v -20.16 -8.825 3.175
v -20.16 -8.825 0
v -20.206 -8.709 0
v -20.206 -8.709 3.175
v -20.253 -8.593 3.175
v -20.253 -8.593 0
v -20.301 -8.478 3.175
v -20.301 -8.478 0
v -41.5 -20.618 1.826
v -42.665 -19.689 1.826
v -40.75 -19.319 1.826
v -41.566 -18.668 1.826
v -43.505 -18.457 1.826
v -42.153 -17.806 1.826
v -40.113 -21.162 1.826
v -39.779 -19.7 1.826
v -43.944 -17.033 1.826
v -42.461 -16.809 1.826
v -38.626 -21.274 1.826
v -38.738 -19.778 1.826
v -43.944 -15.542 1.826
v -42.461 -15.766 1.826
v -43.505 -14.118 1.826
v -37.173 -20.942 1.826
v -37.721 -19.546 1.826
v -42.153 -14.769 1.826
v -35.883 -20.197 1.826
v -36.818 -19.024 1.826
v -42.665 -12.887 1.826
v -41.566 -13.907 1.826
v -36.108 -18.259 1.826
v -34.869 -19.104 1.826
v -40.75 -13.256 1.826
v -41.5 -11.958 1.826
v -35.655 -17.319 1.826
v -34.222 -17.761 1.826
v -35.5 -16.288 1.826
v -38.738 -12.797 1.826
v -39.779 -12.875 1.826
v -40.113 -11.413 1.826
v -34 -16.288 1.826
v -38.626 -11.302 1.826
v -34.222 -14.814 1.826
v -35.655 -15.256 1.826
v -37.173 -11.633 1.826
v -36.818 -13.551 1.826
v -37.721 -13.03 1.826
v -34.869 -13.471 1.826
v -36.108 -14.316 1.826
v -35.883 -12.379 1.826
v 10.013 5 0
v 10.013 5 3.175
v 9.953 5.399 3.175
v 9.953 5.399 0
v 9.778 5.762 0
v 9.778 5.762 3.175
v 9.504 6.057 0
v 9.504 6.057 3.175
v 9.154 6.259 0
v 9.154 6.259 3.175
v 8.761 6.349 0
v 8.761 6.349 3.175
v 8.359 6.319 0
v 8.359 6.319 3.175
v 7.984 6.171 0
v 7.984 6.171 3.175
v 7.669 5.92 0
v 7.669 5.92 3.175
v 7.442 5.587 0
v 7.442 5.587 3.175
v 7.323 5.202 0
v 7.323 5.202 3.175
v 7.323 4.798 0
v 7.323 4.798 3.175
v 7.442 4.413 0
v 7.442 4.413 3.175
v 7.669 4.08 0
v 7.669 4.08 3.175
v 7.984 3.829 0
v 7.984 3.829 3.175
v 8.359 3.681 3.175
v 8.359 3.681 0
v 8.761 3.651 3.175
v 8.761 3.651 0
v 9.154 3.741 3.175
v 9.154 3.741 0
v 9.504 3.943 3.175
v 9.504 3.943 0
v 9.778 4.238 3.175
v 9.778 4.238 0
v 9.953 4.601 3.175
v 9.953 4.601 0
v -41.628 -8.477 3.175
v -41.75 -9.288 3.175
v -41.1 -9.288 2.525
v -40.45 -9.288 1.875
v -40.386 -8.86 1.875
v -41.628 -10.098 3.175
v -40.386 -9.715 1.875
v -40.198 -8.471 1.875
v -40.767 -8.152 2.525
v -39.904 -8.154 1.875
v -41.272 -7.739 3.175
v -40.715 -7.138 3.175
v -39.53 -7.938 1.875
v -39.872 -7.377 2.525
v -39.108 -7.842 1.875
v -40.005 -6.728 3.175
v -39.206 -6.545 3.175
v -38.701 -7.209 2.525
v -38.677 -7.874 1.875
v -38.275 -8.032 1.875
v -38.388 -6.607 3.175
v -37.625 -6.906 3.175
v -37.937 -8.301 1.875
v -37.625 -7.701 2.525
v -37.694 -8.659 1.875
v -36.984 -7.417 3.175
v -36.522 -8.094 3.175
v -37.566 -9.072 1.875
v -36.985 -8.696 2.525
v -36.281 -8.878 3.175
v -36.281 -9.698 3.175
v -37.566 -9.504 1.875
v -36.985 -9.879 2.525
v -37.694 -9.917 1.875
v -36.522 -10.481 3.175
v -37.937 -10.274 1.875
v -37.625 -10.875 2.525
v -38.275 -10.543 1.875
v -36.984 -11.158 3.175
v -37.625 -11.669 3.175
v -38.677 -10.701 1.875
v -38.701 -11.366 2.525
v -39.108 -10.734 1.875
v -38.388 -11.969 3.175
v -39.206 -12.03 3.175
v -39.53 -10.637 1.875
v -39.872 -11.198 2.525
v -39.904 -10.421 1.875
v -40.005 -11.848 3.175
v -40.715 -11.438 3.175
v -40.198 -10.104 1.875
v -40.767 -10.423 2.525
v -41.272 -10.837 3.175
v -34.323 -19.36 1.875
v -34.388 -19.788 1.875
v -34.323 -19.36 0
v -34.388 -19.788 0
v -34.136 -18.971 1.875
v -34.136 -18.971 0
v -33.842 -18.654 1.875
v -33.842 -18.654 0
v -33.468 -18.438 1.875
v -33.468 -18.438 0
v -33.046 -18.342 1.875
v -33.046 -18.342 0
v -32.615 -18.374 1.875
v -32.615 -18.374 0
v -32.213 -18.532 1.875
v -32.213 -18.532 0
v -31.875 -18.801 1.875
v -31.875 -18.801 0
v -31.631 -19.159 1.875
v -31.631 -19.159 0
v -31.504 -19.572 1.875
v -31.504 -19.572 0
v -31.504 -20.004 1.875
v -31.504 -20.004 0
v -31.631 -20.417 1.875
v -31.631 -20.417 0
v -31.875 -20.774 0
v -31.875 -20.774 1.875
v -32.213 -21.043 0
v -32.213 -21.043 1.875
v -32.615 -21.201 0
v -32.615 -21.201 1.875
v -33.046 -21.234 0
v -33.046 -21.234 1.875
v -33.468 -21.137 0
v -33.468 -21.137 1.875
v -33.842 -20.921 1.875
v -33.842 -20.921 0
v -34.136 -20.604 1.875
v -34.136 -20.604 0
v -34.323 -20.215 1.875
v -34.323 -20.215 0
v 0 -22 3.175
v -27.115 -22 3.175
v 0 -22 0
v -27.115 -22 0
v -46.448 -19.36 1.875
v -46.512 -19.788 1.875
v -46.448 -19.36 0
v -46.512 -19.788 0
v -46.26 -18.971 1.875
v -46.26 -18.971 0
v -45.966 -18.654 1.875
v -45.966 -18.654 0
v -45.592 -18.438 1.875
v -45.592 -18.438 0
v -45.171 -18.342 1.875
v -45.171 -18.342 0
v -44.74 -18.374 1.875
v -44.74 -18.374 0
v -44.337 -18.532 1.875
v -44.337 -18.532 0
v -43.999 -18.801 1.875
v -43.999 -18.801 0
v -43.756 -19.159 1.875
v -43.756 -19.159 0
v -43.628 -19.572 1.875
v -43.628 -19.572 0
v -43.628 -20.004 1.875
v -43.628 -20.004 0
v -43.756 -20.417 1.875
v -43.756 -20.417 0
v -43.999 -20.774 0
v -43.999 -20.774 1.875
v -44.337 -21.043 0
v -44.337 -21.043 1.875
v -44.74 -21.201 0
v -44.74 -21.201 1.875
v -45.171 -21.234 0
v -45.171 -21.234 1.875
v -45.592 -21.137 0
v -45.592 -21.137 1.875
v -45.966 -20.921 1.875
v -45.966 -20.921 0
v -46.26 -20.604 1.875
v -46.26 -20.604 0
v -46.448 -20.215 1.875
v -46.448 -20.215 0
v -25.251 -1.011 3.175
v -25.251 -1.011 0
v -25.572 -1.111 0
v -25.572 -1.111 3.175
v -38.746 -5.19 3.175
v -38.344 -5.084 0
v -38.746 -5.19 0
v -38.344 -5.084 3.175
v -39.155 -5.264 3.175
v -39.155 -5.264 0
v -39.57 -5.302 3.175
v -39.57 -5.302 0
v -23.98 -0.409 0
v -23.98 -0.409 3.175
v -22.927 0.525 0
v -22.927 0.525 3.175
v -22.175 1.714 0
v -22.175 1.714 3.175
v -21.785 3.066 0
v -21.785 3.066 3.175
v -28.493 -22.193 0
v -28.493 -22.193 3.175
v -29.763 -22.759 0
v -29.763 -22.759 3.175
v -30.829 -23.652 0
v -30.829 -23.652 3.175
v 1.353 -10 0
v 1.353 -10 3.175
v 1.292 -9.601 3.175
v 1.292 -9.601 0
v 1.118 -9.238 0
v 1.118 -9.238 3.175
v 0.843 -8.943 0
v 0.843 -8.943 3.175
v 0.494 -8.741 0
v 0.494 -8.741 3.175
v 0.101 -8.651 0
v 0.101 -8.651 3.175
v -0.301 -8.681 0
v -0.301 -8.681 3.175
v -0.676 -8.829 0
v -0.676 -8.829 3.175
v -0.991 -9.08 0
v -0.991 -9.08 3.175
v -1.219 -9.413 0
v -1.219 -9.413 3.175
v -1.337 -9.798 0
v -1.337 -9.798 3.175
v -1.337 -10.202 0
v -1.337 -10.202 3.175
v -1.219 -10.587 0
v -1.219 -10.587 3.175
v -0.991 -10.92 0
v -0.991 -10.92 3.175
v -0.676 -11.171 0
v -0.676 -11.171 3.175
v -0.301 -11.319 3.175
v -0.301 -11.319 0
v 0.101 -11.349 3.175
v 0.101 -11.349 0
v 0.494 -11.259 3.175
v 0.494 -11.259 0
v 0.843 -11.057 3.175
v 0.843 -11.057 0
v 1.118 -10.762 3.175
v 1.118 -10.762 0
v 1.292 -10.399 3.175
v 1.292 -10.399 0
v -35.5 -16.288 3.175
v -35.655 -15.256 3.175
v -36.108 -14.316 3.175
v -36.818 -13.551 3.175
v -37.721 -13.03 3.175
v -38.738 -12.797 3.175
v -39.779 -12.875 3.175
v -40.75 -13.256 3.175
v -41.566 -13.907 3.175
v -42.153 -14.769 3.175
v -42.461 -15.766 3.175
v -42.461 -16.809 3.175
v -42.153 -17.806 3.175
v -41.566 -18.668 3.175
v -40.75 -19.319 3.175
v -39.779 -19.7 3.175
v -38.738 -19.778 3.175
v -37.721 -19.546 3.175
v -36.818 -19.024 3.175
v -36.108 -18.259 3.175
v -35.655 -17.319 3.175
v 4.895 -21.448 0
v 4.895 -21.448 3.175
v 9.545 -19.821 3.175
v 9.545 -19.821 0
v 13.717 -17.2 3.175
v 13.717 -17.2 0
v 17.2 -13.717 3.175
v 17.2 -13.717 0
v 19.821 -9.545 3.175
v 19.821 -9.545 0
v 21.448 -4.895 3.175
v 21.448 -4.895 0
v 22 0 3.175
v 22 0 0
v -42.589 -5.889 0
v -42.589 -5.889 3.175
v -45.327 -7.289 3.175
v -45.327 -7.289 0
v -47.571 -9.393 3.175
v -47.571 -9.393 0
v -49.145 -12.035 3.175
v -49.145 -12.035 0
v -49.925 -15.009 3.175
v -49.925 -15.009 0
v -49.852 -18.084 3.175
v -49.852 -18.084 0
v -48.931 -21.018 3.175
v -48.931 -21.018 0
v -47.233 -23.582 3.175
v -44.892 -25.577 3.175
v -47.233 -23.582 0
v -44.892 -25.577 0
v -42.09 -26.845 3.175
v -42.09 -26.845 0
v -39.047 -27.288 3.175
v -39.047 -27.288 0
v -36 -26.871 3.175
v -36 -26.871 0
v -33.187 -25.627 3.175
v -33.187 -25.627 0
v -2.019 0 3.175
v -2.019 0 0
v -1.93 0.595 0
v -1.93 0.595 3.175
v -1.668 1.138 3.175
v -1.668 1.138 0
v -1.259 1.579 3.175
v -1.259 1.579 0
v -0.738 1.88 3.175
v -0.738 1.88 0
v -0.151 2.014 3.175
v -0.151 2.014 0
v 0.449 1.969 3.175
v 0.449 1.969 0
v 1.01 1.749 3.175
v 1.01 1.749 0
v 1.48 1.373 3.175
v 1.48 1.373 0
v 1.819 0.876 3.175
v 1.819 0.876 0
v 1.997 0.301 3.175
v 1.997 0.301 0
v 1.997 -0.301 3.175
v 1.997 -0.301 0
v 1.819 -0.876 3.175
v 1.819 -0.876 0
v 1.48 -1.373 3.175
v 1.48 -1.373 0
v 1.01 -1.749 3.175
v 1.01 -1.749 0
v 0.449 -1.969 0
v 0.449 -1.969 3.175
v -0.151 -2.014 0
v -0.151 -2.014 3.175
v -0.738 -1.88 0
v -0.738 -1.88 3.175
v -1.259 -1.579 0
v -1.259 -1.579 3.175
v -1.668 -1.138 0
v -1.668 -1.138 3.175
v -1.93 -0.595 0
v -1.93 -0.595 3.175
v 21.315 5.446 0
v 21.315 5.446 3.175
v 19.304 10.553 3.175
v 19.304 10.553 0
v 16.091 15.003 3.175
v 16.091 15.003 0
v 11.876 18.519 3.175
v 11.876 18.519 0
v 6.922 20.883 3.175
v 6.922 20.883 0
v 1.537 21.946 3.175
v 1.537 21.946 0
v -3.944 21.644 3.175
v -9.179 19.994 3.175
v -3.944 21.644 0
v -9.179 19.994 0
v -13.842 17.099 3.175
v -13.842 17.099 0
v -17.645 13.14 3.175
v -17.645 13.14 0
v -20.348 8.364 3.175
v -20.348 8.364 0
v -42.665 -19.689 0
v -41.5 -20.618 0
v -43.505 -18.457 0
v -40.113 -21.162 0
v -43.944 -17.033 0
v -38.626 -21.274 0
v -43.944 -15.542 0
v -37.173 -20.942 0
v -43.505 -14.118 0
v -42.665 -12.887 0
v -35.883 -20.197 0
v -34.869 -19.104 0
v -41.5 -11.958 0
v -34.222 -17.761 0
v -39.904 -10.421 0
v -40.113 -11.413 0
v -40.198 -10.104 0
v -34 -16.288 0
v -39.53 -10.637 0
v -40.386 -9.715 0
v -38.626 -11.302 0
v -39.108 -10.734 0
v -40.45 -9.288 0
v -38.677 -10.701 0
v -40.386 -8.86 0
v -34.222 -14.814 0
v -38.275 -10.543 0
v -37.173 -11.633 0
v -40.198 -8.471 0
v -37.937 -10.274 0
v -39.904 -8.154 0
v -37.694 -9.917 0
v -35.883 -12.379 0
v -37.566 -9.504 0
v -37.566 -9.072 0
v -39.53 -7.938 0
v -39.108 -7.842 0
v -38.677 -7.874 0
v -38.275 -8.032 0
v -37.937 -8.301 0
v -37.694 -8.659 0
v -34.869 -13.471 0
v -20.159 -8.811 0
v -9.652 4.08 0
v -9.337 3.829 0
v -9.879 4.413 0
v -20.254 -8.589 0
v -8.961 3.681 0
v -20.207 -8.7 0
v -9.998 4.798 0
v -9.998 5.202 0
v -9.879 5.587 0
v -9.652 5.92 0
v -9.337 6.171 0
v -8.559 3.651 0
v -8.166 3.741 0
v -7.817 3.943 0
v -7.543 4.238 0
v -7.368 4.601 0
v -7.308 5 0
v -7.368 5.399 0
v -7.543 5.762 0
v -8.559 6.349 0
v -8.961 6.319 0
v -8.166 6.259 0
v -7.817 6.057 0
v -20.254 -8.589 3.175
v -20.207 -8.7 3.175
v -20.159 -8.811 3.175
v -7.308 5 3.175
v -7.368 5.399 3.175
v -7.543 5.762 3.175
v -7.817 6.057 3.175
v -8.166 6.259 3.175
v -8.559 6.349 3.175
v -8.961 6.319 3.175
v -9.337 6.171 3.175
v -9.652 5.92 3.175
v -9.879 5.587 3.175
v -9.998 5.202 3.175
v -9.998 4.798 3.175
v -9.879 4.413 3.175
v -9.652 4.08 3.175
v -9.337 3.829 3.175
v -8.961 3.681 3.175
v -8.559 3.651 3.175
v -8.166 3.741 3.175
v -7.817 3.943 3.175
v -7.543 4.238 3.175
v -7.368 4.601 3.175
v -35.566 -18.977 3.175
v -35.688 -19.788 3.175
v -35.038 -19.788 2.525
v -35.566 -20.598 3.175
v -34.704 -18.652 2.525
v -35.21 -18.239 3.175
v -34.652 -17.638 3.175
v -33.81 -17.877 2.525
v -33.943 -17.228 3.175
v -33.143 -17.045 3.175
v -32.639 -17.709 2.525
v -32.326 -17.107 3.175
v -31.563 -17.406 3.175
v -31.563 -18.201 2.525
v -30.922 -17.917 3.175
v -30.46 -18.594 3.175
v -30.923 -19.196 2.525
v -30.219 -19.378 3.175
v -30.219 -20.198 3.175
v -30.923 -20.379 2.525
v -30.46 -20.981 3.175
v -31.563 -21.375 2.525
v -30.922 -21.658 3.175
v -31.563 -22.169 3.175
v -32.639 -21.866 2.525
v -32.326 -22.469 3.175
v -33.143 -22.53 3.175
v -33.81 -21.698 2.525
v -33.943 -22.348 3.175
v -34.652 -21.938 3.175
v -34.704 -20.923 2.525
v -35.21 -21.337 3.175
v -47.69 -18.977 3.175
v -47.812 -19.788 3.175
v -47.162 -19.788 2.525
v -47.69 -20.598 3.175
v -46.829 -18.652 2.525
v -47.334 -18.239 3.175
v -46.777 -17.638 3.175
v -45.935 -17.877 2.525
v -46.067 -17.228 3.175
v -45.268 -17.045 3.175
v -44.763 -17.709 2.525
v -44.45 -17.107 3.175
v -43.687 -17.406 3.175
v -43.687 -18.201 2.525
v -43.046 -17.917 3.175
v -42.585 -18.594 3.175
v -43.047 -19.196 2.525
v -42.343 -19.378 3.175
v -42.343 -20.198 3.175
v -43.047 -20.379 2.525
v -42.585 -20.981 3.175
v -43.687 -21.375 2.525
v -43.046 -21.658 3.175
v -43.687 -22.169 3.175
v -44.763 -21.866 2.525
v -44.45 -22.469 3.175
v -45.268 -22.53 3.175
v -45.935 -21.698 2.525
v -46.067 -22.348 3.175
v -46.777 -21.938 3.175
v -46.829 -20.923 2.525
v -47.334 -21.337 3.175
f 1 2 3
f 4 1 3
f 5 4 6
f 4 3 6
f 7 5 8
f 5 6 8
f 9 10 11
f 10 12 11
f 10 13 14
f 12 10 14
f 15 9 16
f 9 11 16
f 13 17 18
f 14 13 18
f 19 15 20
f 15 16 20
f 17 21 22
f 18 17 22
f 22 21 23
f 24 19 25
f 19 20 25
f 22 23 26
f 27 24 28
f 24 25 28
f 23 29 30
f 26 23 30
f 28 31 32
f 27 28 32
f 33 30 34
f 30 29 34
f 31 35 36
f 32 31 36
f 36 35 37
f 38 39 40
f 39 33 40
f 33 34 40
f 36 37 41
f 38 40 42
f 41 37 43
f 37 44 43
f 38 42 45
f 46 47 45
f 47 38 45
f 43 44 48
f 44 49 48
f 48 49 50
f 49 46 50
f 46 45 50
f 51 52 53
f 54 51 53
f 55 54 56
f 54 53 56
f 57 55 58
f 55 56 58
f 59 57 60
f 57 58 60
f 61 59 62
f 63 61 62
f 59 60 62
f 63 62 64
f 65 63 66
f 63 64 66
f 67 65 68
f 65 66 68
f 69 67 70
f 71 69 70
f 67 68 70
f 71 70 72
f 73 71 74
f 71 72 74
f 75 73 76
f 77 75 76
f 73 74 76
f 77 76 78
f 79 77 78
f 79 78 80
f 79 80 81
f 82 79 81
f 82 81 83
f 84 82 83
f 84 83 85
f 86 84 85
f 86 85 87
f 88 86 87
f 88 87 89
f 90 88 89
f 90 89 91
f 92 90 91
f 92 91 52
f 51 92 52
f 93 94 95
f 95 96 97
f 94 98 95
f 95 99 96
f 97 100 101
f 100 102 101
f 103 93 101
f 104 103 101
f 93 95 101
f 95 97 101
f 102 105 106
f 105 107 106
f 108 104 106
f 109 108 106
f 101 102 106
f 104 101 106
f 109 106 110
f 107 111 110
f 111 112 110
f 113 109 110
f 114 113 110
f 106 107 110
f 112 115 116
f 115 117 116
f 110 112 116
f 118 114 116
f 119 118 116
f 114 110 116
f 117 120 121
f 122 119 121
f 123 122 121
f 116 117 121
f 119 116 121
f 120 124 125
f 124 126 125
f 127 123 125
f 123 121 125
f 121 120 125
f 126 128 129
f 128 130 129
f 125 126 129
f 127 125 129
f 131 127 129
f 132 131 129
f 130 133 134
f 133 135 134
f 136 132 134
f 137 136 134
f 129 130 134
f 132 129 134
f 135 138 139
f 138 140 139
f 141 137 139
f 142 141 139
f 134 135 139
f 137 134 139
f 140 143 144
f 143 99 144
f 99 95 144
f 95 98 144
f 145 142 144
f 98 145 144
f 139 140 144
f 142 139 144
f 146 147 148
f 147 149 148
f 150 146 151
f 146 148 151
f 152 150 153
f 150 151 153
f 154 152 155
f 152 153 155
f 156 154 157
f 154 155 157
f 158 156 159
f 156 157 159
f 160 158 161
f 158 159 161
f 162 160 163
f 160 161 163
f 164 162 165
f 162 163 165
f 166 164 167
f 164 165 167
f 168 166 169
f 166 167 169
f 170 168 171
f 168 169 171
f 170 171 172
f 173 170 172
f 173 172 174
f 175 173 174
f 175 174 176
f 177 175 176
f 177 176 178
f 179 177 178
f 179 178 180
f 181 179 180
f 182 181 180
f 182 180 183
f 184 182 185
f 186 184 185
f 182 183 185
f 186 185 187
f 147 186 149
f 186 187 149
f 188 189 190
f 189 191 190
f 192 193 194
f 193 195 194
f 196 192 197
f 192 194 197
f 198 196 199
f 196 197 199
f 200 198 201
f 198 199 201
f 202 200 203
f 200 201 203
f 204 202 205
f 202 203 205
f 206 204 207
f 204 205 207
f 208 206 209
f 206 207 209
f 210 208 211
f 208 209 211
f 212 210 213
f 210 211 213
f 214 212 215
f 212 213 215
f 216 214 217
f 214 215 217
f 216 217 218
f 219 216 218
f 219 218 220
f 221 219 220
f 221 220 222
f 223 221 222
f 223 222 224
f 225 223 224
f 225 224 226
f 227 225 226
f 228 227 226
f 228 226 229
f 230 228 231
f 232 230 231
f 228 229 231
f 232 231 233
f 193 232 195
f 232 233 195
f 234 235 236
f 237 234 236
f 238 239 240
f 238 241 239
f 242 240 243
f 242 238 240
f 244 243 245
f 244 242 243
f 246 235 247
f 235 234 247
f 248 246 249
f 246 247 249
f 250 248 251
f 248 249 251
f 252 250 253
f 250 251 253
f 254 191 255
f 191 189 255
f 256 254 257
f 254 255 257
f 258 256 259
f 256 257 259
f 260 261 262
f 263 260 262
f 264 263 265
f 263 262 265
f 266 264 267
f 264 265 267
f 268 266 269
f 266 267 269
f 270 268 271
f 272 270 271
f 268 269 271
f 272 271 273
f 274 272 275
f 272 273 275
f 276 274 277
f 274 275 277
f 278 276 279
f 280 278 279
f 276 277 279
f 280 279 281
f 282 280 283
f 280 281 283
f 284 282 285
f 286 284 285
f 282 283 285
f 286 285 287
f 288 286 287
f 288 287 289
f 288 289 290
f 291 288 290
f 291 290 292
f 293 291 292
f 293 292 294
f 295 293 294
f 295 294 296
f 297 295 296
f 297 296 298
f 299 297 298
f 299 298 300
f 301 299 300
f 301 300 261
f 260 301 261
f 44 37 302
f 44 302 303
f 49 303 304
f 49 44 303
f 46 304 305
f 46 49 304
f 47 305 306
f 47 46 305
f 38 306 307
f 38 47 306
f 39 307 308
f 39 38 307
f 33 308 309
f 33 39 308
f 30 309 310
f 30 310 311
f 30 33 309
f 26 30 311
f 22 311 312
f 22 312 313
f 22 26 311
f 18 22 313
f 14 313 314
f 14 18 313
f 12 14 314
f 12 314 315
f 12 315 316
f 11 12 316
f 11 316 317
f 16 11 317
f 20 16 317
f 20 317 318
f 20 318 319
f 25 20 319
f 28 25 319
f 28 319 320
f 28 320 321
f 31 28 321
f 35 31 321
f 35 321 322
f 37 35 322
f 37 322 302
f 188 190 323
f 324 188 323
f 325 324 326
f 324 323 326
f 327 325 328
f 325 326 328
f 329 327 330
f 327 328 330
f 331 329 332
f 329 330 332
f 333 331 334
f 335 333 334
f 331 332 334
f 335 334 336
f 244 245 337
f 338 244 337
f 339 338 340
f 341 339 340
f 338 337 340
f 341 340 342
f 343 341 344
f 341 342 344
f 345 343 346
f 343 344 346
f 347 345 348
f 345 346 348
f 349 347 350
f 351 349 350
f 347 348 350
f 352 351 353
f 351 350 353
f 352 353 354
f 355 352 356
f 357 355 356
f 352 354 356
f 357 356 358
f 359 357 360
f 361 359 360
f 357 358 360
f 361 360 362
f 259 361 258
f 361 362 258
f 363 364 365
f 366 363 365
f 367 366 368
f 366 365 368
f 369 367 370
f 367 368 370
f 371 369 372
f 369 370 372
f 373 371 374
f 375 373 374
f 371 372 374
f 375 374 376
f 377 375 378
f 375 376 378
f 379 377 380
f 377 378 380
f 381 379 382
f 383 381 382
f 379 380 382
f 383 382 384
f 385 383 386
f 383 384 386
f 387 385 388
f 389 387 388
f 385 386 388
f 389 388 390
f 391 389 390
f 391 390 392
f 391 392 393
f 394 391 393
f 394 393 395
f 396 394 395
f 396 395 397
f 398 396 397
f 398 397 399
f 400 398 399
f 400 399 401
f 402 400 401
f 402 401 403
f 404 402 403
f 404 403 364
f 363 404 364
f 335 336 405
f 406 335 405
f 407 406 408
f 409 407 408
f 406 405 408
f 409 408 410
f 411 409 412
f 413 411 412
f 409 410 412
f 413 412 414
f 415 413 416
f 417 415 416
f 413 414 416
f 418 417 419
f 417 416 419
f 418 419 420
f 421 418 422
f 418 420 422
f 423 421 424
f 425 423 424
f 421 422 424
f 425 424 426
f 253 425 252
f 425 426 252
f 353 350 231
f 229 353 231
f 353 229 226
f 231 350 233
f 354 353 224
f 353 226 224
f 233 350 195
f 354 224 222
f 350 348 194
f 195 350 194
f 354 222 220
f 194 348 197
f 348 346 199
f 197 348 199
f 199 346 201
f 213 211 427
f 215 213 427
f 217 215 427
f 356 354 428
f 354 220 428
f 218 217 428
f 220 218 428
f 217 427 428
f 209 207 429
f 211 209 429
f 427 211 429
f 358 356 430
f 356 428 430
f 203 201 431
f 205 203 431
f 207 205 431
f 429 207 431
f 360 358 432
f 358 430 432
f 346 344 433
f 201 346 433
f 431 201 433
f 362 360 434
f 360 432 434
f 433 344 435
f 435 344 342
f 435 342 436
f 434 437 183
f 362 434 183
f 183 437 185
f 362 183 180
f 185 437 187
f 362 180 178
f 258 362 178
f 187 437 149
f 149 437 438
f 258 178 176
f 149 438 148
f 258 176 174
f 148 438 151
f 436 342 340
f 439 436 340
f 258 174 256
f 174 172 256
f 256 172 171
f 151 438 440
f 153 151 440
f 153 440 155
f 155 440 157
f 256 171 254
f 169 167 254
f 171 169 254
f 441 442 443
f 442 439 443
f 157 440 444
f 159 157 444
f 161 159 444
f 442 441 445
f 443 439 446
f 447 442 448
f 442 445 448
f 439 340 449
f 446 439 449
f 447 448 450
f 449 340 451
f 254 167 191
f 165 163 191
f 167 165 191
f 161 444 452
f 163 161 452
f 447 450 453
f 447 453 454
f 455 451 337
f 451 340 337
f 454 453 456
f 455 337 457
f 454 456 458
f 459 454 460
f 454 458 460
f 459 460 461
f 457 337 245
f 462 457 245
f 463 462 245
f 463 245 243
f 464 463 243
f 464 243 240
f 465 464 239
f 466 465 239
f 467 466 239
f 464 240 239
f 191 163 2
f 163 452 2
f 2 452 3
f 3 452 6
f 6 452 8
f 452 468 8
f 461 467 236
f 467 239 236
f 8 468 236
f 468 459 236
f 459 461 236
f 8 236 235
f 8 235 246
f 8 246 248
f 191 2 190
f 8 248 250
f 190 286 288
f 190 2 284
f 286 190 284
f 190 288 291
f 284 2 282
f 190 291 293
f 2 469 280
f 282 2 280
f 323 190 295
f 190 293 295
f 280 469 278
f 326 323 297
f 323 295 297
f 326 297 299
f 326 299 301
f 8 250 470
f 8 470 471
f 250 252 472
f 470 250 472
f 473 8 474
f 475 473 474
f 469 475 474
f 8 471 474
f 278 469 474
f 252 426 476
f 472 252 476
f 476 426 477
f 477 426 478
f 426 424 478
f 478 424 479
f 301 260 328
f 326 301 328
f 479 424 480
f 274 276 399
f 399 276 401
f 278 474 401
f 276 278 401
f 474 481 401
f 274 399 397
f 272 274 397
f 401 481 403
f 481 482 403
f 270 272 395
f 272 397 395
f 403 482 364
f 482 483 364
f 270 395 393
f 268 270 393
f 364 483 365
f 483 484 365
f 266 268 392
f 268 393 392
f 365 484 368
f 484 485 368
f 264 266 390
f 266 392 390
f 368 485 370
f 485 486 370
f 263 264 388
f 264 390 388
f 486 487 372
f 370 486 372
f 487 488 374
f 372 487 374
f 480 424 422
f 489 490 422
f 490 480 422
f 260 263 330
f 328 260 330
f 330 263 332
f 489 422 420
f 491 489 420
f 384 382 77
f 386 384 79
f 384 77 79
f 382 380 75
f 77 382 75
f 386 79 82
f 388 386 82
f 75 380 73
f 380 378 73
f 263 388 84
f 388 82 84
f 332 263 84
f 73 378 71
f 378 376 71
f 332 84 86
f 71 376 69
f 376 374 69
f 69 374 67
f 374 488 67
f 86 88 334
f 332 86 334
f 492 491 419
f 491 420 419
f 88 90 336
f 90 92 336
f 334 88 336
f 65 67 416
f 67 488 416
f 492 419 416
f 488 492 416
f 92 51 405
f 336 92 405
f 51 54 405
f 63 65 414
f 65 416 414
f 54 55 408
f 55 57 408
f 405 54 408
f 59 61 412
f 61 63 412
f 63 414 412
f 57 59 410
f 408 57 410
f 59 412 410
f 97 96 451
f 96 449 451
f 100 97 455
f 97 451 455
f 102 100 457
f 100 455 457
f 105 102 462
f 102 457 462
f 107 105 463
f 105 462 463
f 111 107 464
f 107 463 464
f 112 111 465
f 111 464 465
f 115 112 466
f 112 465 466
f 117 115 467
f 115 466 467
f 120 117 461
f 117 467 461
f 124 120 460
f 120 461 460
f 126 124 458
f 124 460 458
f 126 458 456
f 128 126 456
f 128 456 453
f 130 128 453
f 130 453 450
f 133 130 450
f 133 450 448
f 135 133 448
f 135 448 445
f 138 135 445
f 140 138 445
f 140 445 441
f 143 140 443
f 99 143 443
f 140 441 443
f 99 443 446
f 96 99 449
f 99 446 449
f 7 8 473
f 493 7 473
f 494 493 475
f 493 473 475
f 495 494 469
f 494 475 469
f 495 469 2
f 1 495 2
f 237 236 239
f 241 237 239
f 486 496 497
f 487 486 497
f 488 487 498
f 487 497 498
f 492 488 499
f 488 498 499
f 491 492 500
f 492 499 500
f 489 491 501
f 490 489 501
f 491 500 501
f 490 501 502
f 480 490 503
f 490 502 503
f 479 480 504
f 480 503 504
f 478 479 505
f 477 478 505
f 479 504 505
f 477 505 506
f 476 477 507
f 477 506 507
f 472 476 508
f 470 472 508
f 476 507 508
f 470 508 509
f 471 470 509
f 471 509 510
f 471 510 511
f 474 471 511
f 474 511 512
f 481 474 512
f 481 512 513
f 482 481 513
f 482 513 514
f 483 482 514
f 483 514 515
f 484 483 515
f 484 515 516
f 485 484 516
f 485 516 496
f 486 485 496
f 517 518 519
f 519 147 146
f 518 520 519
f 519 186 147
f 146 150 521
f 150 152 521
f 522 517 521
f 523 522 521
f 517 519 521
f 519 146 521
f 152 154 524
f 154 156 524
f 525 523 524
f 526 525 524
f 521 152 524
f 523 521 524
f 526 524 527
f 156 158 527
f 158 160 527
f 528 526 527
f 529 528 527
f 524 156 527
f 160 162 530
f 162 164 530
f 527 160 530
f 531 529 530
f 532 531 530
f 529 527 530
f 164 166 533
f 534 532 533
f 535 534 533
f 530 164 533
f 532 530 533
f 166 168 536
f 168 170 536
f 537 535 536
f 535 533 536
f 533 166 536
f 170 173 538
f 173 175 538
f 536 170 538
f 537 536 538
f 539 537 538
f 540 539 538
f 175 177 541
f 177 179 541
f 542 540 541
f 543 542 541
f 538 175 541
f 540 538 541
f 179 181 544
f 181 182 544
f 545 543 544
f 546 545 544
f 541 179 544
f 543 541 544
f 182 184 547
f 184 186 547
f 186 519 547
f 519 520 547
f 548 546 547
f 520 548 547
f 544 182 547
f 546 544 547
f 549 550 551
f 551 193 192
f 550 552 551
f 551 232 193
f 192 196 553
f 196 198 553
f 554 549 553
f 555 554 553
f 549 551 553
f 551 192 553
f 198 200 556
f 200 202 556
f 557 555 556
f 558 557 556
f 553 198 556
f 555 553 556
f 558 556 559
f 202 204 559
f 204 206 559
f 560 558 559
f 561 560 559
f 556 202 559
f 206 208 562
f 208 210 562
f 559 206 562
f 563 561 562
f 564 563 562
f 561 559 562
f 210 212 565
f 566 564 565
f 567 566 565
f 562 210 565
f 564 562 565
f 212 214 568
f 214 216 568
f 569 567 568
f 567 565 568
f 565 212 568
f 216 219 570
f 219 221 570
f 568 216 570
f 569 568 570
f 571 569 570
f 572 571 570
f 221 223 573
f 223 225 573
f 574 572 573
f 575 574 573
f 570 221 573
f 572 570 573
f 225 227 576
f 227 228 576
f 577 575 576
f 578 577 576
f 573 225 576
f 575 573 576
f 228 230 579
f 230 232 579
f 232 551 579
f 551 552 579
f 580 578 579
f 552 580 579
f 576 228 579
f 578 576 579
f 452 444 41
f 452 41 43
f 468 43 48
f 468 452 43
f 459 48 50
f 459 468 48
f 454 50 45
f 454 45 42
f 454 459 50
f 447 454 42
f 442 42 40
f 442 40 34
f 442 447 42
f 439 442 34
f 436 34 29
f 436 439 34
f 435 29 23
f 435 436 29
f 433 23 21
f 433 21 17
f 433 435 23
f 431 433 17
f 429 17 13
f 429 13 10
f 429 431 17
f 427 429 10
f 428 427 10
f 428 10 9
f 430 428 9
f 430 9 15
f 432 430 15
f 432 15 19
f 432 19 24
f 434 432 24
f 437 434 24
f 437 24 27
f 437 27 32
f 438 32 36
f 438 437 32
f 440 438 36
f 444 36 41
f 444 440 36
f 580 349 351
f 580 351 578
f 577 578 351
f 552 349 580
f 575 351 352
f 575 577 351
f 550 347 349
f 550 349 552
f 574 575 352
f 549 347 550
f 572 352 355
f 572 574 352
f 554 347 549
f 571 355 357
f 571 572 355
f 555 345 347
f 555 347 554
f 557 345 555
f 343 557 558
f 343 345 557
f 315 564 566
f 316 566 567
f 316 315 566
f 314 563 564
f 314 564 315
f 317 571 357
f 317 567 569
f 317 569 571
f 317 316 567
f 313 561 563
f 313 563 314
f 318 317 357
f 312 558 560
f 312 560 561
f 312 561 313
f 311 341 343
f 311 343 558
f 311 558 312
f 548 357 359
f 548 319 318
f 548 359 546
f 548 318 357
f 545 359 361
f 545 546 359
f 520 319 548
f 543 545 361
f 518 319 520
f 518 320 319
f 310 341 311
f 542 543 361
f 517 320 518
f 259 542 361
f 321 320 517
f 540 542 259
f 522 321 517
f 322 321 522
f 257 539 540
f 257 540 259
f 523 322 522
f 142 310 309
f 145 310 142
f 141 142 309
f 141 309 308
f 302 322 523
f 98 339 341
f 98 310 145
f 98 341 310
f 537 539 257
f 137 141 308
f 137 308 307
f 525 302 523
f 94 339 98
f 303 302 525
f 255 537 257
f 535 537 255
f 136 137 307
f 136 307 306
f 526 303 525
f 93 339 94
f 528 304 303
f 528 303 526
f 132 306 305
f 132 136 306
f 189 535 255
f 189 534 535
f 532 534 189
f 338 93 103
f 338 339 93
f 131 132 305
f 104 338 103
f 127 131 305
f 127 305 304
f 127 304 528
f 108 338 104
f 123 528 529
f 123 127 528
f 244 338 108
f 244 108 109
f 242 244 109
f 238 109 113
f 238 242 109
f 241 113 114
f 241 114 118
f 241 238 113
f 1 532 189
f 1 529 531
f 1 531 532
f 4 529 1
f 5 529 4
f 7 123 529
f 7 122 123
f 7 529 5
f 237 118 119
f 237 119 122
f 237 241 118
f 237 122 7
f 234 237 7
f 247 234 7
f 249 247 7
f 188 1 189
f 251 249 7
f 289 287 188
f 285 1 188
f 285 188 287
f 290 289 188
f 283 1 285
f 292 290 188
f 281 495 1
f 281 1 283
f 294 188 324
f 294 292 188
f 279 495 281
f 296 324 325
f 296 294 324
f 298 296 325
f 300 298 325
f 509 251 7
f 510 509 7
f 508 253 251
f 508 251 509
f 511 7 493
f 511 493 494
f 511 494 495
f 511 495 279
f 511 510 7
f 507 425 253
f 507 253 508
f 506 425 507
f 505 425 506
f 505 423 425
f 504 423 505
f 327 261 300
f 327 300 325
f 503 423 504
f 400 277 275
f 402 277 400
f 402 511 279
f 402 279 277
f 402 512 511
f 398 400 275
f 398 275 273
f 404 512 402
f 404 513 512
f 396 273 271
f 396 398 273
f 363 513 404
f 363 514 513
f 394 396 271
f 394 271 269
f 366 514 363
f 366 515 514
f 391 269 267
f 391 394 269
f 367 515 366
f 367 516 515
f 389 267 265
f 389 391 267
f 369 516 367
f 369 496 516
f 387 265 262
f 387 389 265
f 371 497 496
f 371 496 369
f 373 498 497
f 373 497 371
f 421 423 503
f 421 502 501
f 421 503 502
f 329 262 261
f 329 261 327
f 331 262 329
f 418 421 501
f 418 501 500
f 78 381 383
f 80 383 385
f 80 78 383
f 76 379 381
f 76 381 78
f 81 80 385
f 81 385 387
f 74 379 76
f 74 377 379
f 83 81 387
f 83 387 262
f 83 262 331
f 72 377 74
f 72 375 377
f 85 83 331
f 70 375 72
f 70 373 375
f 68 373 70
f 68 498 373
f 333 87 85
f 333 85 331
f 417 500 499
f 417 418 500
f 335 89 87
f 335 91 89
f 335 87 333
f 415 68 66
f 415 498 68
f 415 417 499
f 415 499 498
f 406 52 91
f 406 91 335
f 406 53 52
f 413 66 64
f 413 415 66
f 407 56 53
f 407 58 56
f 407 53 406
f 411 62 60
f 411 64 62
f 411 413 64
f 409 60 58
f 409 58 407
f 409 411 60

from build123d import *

# Parameters (mm, degrees)
SKETCH1_R                                         = 3.50012
BODY_DEPTH                                        = 3.175
CSK_FOR_M2_5_FLAT_HEAD_MACHINE_SCREW1_D           = 2.9
CSK_FOR_M2_5_FLAT_HEAD_MACHINE_SCREW1_CSINK_D     = 5.5
CSK_FOR_M2_5_FLAT_HEAD_MACHINE_SCREW1_CSINK_ANGLE = 90
FILLET1_R                                         = 5
F_10_32_TAPPED_HOLE2_D                            = 4.0386
F_10_32_TAPPED_HOLE2_DEPTH                        = 12.03
F_10_32_TAPPED_HOLE2_TIP                          = 1.213317848
F_6_32_TAPPED_HOLE1_D                             = 2.7051
F_6_32_TAPPED_HOLE1_DEPTH                         = 9.39
F_6_32_TAPPED_HOLE1_TIP                           = 0.81269403
SKETCH1_3_R                                       = 5
SKETCH1_3_R_2                                     = 3.50012
MOTOR_COLLAR_RECESS_DEPTH                         = 1.82626


with BuildPart() as part:
    # Sketch1 → Body (new body)
    with BuildSketch(Plane.XY):
        with BuildLine():
            Line((-22, 0), (-39, -5.28767268))
            ThreePointArc((-39, -5.28767268), (-48.587377131, -21.680464141), (-29.59950445, -22))
            Line((-29.59950445, -22), (0, -22))
            ThreePointArc((0, -22), (15.556349186, 15.556349186), (-22, 0))
        make_face()
        with BuildLine():
            ThreePointArc((-20.300723283, -8.478244759), (-20.230414586, -8.644670364), (-20.158741556, -8.810512975))
            Line((-20.158741556, -8.810512975), (-20.159744108, -8.824772966))
            ThreePointArc((-20.159744108, -8.824772966), (-20.22943401, -8.651183524), (-20.300723283, -8.478244759))
        make_face(mode=Mode.SUBTRACT)
        with Locations((-39, -16.28767268)):
            Circle(SKETCH1_R, mode=Mode.SUBTRACT)
    extrude(amount=BODY_DEPTH)

    # CSK for M2.5 Flat Head Machine Screw1 (through all)
    with Locations(Plane(origin=(-39, -9.28767268, 3.175), x_dir=(1, 0, 0), z_dir=(0, 0, 1))):
        with Locations((0, 0), (-6.062177826, -10.5), (6.062177826, -10.5)):
            CounterSinkHole(CSK_FOR_M2_5_FLAT_HEAD_MACHINE_SCREW1_D / 2, CSK_FOR_M2_5_FLAT_HEAD_MACHINE_SCREW1_CSINK_D / 2, counter_sink_angle=CSK_FOR_M2_5_FLAT_HEAD_MACHINE_SCREW1_CSINK_ANGLE)

    # Fillet1
    fillet1_edges = [part.edges().sort_by_distance(p)[0] for p in [
        (-29.59950445, -22, 1.5875),
        (-39, -5.28767268, 1.5875),
        (-22, 0, 1.5875),
    ]]
    fillet(fillet1_edges, radius=FILLET1_R)

    # #10-32 Tapped Hole2
    with Locations(Plane.XY.offset(3.175)):
        with Locations((0, 0)):
            Hole(F_10_32_TAPPED_HOLE2_D / 2, depth=F_10_32_TAPPED_HOLE2_DEPTH)
            with Locations((0, 0, -(F_10_32_TAPPED_HOLE2_DEPTH + F_10_32_TAPPED_HOLE2_TIP / 2))):  # 118° drill point
                Cone(0, F_10_32_TAPPED_HOLE2_D / 2, F_10_32_TAPPED_HOLE2_TIP, mode=Mode.SUBTRACT)

    # #6-32 Tapped Hole1
    with Locations(Plane(origin=(-8.660254038, 5, 0), x_dir=(-1, 0, 0), z_dir=(0, 0, -1))):
        with Locations((0, 0), (-17.320508076, 0), (-8.660254038, -15)):
            Hole(F_6_32_TAPPED_HOLE1_D / 2, depth=F_6_32_TAPPED_HOLE1_DEPTH)
            with Locations((0, 0, -(F_6_32_TAPPED_HOLE1_DEPTH + F_6_32_TAPPED_HOLE1_TIP / 2))):  # 118° drill point
                Cone(0, F_6_32_TAPPED_HOLE1_D / 2, F_6_32_TAPPED_HOLE1_TIP, mode=Mode.SUBTRACT)

    # Sketch1<3> → Motor Collar Recess (cut)
    with BuildSketch(Plane.XY):
        with Locations((-39, -16.28767268)):
            Circle(SKETCH1_3_R)
        with Locations((-39, -16.28767268)):
            Circle(SKETCH1_3_R_2, mode=Mode.SUBTRACT)
    extrude(amount=MOTOR_COLLAR_RECESS_DEPTH, mode=Mode.SUBTRACT)


solid = part.part
